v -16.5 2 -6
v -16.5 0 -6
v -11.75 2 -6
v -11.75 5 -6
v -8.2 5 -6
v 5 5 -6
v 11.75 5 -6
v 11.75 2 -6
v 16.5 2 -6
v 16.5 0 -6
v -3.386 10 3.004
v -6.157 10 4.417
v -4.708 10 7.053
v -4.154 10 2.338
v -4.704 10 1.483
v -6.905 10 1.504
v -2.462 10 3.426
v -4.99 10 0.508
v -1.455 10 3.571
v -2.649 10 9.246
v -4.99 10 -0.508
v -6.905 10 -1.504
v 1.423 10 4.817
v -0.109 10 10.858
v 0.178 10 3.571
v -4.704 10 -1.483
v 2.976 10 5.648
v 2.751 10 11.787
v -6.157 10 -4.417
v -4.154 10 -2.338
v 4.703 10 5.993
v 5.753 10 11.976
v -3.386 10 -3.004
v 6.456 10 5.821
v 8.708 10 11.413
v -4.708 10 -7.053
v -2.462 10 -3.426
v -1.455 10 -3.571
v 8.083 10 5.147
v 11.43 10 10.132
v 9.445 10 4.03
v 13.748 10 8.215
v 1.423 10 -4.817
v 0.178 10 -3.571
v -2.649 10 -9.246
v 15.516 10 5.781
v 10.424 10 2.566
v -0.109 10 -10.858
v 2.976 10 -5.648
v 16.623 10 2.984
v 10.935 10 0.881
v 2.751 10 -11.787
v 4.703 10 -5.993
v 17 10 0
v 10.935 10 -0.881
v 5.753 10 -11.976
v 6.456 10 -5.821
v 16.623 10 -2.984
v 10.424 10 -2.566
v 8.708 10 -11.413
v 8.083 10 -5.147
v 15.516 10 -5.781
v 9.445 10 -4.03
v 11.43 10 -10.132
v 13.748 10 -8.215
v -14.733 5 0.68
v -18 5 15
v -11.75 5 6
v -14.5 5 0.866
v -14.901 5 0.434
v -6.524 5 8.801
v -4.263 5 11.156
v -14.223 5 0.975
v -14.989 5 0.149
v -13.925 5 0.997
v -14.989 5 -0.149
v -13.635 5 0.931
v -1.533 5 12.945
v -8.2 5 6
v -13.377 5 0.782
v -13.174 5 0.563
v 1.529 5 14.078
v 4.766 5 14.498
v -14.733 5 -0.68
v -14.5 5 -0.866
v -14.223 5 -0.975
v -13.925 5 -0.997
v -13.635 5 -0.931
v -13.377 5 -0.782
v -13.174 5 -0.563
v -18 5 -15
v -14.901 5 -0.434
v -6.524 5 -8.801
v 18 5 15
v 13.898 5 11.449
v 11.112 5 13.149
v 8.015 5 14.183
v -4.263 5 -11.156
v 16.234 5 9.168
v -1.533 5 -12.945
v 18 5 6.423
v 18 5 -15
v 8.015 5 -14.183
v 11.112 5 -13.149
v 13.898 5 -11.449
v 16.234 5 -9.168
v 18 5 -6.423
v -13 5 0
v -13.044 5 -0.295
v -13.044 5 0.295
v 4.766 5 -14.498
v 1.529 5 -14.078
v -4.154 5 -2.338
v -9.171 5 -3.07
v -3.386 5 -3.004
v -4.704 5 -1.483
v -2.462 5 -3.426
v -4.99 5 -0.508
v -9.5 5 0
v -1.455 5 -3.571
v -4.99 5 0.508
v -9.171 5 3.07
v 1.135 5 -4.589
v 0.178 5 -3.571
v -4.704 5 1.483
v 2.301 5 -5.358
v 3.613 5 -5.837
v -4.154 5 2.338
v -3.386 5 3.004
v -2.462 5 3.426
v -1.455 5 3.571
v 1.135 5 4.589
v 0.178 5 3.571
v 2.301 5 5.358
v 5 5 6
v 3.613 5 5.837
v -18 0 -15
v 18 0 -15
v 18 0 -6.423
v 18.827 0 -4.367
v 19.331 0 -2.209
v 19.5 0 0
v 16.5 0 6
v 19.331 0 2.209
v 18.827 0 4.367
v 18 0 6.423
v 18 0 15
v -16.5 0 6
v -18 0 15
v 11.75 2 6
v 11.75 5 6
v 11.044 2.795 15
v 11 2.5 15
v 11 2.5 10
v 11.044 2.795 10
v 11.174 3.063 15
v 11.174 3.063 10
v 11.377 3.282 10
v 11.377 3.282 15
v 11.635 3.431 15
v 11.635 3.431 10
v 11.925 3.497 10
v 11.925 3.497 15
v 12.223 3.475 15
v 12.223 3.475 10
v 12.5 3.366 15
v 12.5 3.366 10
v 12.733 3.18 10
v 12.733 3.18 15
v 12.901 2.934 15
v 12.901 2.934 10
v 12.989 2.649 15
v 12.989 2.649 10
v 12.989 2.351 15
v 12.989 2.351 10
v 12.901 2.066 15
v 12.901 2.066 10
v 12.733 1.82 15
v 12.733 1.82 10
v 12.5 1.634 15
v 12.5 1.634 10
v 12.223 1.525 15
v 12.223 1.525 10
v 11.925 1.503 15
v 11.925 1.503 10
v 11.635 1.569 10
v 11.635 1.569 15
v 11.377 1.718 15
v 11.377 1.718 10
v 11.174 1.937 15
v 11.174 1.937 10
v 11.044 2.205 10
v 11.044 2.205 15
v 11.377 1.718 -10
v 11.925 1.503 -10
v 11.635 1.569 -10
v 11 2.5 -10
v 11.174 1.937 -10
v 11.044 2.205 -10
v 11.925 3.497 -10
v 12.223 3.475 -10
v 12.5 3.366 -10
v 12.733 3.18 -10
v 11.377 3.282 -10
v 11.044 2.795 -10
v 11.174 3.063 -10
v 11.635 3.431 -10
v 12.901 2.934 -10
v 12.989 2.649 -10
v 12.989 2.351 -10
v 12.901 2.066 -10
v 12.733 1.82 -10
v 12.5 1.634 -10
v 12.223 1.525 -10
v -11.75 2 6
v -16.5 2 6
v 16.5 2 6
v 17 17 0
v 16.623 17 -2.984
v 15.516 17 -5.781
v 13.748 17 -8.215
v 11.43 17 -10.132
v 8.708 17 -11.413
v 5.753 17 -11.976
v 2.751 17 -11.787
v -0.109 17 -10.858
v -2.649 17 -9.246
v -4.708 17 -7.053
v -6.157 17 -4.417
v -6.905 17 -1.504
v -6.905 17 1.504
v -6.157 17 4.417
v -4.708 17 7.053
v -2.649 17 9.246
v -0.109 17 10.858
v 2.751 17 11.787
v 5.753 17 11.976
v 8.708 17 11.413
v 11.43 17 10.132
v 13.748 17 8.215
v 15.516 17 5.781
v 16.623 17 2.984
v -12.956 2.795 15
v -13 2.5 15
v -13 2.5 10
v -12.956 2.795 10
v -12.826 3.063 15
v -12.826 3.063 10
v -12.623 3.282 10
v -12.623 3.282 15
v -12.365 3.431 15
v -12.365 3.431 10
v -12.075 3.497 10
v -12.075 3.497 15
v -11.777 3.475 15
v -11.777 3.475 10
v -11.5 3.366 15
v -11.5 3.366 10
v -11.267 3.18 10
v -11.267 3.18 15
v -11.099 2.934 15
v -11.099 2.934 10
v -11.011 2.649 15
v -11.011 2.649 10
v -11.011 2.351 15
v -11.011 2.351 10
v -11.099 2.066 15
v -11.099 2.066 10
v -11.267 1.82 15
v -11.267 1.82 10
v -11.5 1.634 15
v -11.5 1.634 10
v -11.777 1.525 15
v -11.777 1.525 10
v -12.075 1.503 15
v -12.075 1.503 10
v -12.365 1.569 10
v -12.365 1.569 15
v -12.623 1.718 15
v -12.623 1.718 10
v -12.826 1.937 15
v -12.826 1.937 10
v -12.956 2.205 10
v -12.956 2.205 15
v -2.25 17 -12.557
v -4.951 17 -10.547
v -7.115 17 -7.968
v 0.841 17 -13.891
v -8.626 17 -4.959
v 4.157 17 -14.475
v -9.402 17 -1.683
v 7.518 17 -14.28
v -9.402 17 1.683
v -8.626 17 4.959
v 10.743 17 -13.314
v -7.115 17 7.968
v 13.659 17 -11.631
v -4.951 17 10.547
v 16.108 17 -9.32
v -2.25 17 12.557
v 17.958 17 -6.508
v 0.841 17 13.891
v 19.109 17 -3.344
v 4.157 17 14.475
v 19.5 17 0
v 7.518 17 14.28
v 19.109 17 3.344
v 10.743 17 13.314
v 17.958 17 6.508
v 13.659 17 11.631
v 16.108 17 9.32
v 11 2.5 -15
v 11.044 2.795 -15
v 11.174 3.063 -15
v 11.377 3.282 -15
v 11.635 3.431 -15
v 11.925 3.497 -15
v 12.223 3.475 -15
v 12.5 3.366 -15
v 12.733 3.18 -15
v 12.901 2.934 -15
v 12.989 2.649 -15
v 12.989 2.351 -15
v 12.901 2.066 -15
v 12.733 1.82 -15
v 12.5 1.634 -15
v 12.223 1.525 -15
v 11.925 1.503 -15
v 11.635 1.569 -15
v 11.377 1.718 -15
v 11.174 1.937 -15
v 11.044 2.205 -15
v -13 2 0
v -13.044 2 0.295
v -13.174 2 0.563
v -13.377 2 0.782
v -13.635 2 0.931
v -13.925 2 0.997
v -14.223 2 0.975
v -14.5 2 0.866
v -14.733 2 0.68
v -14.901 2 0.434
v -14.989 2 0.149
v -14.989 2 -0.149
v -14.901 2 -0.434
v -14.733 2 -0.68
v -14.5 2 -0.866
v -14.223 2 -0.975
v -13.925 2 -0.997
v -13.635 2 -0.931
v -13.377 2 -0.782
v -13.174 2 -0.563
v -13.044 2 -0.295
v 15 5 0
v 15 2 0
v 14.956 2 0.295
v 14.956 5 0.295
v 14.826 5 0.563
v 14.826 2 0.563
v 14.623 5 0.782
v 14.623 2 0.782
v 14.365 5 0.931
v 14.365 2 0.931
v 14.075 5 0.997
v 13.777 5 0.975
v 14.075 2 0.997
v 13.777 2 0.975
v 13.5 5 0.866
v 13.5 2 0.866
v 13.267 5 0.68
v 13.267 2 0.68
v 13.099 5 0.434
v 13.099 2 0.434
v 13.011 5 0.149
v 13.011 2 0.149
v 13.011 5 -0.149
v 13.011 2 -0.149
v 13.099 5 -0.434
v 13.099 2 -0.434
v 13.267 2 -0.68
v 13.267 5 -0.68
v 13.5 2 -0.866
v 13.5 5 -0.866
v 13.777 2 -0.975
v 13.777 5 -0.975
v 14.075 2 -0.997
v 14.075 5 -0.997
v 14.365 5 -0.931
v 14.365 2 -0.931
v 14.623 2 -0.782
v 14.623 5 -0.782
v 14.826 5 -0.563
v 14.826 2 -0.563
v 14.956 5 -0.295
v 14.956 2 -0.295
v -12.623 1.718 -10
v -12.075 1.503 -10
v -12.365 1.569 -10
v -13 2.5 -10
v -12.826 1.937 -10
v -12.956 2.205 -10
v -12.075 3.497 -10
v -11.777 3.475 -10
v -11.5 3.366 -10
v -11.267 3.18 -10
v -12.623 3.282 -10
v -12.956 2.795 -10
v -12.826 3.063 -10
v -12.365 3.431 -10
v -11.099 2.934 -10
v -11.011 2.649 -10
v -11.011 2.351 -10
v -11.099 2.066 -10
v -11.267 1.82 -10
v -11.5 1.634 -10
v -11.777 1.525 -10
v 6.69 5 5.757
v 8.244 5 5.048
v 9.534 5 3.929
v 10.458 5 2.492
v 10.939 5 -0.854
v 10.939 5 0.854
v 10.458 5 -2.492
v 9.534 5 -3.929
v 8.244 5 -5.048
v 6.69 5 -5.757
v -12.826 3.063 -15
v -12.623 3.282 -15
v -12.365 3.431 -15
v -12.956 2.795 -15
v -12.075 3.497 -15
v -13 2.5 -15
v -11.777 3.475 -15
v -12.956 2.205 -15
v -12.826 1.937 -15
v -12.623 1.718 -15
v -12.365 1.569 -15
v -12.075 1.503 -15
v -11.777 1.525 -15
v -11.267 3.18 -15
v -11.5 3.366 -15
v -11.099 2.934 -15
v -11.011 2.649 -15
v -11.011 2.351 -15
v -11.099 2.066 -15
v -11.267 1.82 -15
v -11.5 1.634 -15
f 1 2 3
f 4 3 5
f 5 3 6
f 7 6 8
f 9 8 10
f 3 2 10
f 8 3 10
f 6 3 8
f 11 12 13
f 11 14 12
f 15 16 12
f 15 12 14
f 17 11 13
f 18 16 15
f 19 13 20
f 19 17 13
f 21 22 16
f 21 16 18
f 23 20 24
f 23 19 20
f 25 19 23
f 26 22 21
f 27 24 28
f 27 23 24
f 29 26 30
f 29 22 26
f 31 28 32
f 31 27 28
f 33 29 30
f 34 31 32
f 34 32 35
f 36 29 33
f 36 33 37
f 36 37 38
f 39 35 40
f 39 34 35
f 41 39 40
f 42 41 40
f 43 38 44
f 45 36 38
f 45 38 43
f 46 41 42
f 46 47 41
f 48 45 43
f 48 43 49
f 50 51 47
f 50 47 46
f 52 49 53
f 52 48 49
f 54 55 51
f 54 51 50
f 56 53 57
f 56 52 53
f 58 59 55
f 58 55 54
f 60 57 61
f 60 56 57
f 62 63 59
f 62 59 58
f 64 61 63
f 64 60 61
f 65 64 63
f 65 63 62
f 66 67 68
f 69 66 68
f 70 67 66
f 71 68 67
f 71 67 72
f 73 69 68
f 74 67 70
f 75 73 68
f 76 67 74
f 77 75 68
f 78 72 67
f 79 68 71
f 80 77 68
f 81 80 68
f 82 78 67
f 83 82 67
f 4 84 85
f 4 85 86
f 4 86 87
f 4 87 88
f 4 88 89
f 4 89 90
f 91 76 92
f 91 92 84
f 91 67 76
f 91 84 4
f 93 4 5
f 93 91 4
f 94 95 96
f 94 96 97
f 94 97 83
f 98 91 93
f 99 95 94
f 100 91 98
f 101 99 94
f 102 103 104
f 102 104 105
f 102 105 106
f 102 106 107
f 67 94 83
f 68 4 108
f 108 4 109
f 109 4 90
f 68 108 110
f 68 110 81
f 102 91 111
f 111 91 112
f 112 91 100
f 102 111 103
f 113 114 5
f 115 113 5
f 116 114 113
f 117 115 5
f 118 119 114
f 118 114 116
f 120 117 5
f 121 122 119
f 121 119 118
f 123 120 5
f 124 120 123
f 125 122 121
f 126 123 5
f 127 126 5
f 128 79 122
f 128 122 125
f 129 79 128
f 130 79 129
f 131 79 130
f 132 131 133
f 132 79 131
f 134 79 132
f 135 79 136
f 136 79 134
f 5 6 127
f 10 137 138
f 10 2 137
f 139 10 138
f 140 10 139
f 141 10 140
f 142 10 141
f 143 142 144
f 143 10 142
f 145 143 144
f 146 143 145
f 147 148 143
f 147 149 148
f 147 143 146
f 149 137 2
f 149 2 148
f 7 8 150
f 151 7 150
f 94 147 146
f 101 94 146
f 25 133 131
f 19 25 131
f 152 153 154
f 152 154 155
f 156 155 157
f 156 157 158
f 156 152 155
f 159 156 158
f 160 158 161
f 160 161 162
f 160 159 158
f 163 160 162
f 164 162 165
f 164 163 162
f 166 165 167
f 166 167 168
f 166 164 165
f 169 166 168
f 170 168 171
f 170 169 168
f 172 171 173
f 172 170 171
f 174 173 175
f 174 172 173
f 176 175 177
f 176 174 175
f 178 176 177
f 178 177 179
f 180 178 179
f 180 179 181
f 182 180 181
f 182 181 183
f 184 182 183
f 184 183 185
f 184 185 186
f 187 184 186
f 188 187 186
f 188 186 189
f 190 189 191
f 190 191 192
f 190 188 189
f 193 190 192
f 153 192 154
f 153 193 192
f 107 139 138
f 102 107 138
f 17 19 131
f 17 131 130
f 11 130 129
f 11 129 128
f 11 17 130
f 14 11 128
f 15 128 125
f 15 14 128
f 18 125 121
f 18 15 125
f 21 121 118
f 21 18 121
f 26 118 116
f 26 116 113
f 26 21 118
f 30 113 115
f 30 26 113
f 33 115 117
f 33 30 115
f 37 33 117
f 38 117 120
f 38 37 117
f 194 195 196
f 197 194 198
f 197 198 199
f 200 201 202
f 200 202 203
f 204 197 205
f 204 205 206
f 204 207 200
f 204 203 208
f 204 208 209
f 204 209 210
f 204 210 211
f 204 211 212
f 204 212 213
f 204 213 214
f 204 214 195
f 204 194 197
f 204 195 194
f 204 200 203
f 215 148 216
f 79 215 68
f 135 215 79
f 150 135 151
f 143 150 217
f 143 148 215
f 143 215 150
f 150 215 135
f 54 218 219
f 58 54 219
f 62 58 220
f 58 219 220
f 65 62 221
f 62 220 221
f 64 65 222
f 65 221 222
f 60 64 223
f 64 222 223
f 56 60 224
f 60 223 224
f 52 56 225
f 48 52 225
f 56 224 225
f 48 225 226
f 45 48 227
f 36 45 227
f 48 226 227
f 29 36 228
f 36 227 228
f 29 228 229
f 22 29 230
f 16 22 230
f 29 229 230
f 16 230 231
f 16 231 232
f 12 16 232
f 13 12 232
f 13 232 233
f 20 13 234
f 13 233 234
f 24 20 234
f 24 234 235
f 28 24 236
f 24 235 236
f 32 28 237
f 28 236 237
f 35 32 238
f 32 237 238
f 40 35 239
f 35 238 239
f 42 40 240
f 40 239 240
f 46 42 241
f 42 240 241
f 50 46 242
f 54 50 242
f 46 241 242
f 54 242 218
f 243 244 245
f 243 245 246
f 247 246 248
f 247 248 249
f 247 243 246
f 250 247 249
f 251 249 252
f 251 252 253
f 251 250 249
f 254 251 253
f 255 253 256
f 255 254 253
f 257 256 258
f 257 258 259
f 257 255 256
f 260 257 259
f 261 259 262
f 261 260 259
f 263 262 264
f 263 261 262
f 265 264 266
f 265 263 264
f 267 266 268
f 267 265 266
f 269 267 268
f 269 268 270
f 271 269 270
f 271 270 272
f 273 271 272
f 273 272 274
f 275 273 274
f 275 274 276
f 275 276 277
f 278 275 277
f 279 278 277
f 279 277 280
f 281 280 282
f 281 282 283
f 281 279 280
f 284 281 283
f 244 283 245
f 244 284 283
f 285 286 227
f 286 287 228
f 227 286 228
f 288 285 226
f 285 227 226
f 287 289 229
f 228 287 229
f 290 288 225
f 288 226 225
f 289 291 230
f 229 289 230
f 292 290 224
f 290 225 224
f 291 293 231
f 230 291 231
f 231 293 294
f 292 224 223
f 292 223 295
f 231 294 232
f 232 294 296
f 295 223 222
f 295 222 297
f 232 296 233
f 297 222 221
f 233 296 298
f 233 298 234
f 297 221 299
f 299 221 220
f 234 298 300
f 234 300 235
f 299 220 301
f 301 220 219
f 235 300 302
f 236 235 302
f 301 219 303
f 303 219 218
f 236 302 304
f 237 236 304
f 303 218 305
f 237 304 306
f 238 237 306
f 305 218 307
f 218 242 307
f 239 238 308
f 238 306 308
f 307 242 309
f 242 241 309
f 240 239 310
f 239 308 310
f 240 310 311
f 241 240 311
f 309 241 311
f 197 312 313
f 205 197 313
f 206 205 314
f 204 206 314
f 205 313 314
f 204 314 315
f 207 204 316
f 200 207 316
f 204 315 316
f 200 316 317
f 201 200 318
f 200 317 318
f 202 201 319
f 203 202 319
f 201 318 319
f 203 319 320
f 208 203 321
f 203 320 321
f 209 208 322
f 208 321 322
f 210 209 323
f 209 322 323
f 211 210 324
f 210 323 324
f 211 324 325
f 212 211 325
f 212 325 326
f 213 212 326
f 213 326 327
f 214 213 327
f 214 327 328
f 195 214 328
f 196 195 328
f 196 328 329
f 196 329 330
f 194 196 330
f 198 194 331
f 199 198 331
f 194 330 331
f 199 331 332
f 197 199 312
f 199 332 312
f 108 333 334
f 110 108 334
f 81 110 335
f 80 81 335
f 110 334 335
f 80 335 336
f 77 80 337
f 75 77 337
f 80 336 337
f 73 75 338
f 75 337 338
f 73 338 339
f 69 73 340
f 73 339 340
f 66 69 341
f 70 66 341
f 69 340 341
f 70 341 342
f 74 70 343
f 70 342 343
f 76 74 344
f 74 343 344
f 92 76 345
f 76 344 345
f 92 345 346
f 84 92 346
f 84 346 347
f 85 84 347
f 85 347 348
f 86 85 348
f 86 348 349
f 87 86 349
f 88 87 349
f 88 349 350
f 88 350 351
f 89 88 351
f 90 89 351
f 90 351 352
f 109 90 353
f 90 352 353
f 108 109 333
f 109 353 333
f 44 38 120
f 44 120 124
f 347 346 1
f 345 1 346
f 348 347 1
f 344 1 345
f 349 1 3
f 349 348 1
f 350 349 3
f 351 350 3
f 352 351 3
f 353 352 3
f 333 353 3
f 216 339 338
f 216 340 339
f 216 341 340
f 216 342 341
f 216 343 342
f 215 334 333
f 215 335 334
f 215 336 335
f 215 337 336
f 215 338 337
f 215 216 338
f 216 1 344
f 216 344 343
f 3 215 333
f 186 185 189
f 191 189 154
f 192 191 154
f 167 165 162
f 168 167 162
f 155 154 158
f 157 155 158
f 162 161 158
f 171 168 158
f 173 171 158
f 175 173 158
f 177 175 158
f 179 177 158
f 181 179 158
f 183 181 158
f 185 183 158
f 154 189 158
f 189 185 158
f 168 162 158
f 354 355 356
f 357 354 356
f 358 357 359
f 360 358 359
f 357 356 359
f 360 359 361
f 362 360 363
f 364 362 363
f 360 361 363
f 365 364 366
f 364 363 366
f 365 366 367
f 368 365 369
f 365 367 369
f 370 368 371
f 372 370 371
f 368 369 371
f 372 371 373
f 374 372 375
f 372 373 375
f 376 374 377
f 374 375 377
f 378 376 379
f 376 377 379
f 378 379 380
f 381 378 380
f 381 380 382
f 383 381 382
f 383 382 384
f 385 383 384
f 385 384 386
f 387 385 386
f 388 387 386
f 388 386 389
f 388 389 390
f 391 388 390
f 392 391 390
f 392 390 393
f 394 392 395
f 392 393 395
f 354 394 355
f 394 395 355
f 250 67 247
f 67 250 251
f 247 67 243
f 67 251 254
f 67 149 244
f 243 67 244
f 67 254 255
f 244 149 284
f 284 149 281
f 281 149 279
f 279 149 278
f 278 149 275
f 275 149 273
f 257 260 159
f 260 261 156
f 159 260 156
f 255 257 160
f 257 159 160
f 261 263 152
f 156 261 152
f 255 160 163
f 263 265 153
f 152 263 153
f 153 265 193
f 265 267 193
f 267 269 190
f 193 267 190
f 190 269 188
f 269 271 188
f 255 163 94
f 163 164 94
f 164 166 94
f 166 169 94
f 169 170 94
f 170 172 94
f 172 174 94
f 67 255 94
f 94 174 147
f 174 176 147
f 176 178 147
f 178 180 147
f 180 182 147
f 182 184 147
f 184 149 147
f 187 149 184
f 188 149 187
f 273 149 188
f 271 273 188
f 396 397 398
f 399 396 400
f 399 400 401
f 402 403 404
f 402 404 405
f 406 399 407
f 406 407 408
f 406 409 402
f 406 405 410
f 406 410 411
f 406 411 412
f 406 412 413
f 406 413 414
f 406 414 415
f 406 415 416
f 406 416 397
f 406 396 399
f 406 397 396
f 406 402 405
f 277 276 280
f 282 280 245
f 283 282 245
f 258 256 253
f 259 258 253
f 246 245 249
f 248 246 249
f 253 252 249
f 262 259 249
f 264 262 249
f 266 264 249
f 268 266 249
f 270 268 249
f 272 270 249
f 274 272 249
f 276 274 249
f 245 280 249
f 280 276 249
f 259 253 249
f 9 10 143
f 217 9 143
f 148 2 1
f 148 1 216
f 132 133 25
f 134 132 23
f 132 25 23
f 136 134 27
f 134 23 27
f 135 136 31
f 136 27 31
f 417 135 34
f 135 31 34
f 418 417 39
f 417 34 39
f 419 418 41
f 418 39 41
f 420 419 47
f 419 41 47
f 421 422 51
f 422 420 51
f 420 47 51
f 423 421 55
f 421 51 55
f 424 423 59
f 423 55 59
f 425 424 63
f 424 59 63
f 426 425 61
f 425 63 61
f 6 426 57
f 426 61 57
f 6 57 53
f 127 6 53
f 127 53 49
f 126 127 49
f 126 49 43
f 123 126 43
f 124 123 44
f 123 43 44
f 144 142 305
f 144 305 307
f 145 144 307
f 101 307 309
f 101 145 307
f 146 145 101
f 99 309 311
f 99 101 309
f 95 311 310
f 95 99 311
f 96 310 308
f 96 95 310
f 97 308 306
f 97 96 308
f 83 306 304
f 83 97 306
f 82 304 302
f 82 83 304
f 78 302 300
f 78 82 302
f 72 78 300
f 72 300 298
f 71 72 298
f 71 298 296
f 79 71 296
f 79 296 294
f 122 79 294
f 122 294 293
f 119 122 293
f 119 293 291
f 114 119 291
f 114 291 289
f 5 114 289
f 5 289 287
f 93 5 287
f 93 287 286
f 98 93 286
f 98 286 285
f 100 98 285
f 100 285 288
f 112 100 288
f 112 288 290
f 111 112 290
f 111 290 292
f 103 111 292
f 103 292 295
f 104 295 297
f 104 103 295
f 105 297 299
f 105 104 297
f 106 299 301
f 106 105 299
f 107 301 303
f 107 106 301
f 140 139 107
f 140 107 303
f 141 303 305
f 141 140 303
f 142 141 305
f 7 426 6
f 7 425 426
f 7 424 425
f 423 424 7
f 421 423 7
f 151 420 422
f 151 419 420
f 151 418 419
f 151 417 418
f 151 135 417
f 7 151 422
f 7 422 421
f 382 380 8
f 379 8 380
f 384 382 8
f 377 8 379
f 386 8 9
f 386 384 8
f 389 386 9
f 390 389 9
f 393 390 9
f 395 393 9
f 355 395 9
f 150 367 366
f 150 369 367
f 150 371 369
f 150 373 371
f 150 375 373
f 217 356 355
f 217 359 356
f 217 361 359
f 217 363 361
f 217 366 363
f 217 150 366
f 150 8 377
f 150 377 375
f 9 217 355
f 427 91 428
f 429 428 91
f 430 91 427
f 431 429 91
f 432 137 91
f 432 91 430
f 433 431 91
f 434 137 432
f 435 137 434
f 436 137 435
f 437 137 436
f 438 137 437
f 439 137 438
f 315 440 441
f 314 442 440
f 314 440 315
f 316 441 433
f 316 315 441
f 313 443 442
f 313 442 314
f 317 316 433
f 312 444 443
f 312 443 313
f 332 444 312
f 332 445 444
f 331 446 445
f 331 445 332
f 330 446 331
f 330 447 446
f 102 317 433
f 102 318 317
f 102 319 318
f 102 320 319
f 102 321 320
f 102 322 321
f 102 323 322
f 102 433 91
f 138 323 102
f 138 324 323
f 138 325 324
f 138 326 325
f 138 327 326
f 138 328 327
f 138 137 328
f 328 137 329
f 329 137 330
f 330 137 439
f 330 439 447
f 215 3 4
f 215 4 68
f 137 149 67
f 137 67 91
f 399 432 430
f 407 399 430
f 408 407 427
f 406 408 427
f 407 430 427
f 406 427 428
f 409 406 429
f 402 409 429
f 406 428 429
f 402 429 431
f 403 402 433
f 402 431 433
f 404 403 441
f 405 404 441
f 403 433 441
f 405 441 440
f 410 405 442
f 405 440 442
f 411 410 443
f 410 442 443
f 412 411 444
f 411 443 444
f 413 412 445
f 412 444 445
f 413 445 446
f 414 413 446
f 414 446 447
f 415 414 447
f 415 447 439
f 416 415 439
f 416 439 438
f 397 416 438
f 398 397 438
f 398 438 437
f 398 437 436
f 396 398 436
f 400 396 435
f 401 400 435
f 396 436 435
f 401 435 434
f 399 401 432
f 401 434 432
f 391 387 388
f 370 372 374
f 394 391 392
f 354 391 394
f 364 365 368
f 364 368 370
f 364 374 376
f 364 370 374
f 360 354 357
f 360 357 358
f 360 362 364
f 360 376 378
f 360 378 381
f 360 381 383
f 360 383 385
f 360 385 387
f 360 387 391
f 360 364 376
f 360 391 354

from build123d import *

# Parameters (mm, degrees)
SKETCH_1_W               = 36
SKETCH_1_H               = 30
EXTRUDE_1_DEPTH          = 5
SKETCH_2_R               = 14.5
EXTRUDE_2_DEPTH          = 17
SKETCH_4_W               = 33
SKETCH_4_H               = 12
CUT_EXTRUDE_2_DEPTH      = 2
SKETCH_8_R               = 1
CUT_EXTRUDE_6_DEPTH      = 3
SKETCH_5_W               = 23.5
SKETCH_5_H               = 12
CUT_EXTRUDE_3_DEPTH      = 3
CUT_EXTRUDE_3_DEPTH_BACK = 3
SKETCH_3_R               = 12
CUT_EXTRUDE_1_DEPTH      = 7
SKETCH_6_R               = 6
CUT_EXTRUDE_4_DEPTH      = 5
CUT_EXTRUDE_5_DEPTH      = 5
SKETCH_9_R               = 1
CUT_EXTRUDE_7_DEPTH      = 5


with BuildPart() as part:
    # 草图1 → 凸台-拉伸1 (new body)
    with BuildSketch(Plane(origin=(0, 0, 0), x_dir=(1, 0, 0), z_dir=(0, 1, 0))):
        Rectangle(SKETCH_1_W, SKETCH_1_H)
    extrude(amount=EXTRUDE_1_DEPTH)

    # 草图2 → 凸台-拉伸2 (add)
    with BuildSketch(Plane.XZ):
        with Locations((5, 0)):
            Circle(SKETCH_2_R)
    extrude(amount=-EXTRUDE_2_DEPTH)

    # 草图4 → 切除-拉伸2 (cut)
    with BuildSketch(Plane.XZ):
        Rectangle(SKETCH_4_W, SKETCH_4_H)
    extrude(amount=-CUT_EXTRUDE_2_DEPTH, mode=Mode.SUBTRACT)

    # 草图8 → 切除-拉伸6 (cut)
    with BuildSketch(Plane.XZ.offset(-2)):
        with Locations((14, 0)):
            Circle(SKETCH_8_R)
        with Locations((-14, 0)):
            Circle(SKETCH_8_R)
    extrude(amount=-CUT_EXTRUDE_6_DEPTH, mode=Mode.SUBTRACT)

    # 草图5 → 切除-拉伸3 (cut, two sides)
    with BuildSketch(Plane.XZ.offset(-2)) as cut_extrude_3_sk:
        Rectangle(SKETCH_5_W, SKETCH_5_H)
    extrude(amount=CUT_EXTRUDE_3_DEPTH, mode=Mode.SUBTRACT)
    extrude(cut_extrude_3_sk.sketch, amount=-CUT_EXTRUDE_3_DEPTH_BACK, mode=Mode.SUBTRACT)

    # 草图3 → 切除-拉伸1 (cut)
    with BuildSketch(Plane(origin=(0, 17, 0), x_dir=(1, 0, 0), z_dir=(0, 1, 0))):
        with Locations((5, 0)):
            Circle(SKETCH_3_R)
    extrude(amount=-CUT_EXTRUDE_1_DEPTH, mode=Mode.SUBTRACT)

    # 草图6 → 切除-拉伸4 (cut)
    with BuildSketch(Plane(origin=(0, 10, 0), x_dir=(1, 0, 0), z_dir=(0, 1, 0))):
        with Locations((5, 0)):
            Circle(SKETCH_6_R)
    extrude(amount=-CUT_EXTRUDE_4_DEPTH, mode=Mode.SUBTRACT)

    # 草图7 → 切除-拉伸5 (cut)
    with BuildSketch(Plane(origin=(0, 10, 0), x_dir=(1, 0, 0), z_dir=(0, 1, 0))):
        with BuildLine():
            Line((-1.455492537, 3.570915288), (2.115422752, 3.570915288))
            Line((2.115422752, 3.570915288), (2.115422752, -3.570915288))
            Line((2.115422752, -3.570915288), (-1.455492537, -3.570915288))
            ThreePointArc((-1.455492537, -3.570915288), (-5.026407825, 0), (-1.455492537, 3.570915288))
        make_face()
    extrude(amount=-CUT_EXTRUDE_5_DEPTH, mode=Mode.SUBTRACT)

    # 草图9 → 切除-拉伸7 (cut)
    with BuildSketch(Plane(origin=(0, 0, -15), x_dir=(-1, 0, 0), z_dir=(0, 0, -1))):
        with Locations((12, 2.5)):
            Circle(SKETCH_9_R)
        with Locations((-12, 2.5)):
            Circle(SKETCH_9_R)
    cut_extrude_7 = extrude(amount=-CUT_EXTRUDE_7_DEPTH, mode=Mode.SUBTRACT)

    # 镜向1: 切除-拉伸7 across plane
    add(cut_extrude_7.mirror(Plane.XY), mode=Mode.SUBTRACT)


solid = part.part
